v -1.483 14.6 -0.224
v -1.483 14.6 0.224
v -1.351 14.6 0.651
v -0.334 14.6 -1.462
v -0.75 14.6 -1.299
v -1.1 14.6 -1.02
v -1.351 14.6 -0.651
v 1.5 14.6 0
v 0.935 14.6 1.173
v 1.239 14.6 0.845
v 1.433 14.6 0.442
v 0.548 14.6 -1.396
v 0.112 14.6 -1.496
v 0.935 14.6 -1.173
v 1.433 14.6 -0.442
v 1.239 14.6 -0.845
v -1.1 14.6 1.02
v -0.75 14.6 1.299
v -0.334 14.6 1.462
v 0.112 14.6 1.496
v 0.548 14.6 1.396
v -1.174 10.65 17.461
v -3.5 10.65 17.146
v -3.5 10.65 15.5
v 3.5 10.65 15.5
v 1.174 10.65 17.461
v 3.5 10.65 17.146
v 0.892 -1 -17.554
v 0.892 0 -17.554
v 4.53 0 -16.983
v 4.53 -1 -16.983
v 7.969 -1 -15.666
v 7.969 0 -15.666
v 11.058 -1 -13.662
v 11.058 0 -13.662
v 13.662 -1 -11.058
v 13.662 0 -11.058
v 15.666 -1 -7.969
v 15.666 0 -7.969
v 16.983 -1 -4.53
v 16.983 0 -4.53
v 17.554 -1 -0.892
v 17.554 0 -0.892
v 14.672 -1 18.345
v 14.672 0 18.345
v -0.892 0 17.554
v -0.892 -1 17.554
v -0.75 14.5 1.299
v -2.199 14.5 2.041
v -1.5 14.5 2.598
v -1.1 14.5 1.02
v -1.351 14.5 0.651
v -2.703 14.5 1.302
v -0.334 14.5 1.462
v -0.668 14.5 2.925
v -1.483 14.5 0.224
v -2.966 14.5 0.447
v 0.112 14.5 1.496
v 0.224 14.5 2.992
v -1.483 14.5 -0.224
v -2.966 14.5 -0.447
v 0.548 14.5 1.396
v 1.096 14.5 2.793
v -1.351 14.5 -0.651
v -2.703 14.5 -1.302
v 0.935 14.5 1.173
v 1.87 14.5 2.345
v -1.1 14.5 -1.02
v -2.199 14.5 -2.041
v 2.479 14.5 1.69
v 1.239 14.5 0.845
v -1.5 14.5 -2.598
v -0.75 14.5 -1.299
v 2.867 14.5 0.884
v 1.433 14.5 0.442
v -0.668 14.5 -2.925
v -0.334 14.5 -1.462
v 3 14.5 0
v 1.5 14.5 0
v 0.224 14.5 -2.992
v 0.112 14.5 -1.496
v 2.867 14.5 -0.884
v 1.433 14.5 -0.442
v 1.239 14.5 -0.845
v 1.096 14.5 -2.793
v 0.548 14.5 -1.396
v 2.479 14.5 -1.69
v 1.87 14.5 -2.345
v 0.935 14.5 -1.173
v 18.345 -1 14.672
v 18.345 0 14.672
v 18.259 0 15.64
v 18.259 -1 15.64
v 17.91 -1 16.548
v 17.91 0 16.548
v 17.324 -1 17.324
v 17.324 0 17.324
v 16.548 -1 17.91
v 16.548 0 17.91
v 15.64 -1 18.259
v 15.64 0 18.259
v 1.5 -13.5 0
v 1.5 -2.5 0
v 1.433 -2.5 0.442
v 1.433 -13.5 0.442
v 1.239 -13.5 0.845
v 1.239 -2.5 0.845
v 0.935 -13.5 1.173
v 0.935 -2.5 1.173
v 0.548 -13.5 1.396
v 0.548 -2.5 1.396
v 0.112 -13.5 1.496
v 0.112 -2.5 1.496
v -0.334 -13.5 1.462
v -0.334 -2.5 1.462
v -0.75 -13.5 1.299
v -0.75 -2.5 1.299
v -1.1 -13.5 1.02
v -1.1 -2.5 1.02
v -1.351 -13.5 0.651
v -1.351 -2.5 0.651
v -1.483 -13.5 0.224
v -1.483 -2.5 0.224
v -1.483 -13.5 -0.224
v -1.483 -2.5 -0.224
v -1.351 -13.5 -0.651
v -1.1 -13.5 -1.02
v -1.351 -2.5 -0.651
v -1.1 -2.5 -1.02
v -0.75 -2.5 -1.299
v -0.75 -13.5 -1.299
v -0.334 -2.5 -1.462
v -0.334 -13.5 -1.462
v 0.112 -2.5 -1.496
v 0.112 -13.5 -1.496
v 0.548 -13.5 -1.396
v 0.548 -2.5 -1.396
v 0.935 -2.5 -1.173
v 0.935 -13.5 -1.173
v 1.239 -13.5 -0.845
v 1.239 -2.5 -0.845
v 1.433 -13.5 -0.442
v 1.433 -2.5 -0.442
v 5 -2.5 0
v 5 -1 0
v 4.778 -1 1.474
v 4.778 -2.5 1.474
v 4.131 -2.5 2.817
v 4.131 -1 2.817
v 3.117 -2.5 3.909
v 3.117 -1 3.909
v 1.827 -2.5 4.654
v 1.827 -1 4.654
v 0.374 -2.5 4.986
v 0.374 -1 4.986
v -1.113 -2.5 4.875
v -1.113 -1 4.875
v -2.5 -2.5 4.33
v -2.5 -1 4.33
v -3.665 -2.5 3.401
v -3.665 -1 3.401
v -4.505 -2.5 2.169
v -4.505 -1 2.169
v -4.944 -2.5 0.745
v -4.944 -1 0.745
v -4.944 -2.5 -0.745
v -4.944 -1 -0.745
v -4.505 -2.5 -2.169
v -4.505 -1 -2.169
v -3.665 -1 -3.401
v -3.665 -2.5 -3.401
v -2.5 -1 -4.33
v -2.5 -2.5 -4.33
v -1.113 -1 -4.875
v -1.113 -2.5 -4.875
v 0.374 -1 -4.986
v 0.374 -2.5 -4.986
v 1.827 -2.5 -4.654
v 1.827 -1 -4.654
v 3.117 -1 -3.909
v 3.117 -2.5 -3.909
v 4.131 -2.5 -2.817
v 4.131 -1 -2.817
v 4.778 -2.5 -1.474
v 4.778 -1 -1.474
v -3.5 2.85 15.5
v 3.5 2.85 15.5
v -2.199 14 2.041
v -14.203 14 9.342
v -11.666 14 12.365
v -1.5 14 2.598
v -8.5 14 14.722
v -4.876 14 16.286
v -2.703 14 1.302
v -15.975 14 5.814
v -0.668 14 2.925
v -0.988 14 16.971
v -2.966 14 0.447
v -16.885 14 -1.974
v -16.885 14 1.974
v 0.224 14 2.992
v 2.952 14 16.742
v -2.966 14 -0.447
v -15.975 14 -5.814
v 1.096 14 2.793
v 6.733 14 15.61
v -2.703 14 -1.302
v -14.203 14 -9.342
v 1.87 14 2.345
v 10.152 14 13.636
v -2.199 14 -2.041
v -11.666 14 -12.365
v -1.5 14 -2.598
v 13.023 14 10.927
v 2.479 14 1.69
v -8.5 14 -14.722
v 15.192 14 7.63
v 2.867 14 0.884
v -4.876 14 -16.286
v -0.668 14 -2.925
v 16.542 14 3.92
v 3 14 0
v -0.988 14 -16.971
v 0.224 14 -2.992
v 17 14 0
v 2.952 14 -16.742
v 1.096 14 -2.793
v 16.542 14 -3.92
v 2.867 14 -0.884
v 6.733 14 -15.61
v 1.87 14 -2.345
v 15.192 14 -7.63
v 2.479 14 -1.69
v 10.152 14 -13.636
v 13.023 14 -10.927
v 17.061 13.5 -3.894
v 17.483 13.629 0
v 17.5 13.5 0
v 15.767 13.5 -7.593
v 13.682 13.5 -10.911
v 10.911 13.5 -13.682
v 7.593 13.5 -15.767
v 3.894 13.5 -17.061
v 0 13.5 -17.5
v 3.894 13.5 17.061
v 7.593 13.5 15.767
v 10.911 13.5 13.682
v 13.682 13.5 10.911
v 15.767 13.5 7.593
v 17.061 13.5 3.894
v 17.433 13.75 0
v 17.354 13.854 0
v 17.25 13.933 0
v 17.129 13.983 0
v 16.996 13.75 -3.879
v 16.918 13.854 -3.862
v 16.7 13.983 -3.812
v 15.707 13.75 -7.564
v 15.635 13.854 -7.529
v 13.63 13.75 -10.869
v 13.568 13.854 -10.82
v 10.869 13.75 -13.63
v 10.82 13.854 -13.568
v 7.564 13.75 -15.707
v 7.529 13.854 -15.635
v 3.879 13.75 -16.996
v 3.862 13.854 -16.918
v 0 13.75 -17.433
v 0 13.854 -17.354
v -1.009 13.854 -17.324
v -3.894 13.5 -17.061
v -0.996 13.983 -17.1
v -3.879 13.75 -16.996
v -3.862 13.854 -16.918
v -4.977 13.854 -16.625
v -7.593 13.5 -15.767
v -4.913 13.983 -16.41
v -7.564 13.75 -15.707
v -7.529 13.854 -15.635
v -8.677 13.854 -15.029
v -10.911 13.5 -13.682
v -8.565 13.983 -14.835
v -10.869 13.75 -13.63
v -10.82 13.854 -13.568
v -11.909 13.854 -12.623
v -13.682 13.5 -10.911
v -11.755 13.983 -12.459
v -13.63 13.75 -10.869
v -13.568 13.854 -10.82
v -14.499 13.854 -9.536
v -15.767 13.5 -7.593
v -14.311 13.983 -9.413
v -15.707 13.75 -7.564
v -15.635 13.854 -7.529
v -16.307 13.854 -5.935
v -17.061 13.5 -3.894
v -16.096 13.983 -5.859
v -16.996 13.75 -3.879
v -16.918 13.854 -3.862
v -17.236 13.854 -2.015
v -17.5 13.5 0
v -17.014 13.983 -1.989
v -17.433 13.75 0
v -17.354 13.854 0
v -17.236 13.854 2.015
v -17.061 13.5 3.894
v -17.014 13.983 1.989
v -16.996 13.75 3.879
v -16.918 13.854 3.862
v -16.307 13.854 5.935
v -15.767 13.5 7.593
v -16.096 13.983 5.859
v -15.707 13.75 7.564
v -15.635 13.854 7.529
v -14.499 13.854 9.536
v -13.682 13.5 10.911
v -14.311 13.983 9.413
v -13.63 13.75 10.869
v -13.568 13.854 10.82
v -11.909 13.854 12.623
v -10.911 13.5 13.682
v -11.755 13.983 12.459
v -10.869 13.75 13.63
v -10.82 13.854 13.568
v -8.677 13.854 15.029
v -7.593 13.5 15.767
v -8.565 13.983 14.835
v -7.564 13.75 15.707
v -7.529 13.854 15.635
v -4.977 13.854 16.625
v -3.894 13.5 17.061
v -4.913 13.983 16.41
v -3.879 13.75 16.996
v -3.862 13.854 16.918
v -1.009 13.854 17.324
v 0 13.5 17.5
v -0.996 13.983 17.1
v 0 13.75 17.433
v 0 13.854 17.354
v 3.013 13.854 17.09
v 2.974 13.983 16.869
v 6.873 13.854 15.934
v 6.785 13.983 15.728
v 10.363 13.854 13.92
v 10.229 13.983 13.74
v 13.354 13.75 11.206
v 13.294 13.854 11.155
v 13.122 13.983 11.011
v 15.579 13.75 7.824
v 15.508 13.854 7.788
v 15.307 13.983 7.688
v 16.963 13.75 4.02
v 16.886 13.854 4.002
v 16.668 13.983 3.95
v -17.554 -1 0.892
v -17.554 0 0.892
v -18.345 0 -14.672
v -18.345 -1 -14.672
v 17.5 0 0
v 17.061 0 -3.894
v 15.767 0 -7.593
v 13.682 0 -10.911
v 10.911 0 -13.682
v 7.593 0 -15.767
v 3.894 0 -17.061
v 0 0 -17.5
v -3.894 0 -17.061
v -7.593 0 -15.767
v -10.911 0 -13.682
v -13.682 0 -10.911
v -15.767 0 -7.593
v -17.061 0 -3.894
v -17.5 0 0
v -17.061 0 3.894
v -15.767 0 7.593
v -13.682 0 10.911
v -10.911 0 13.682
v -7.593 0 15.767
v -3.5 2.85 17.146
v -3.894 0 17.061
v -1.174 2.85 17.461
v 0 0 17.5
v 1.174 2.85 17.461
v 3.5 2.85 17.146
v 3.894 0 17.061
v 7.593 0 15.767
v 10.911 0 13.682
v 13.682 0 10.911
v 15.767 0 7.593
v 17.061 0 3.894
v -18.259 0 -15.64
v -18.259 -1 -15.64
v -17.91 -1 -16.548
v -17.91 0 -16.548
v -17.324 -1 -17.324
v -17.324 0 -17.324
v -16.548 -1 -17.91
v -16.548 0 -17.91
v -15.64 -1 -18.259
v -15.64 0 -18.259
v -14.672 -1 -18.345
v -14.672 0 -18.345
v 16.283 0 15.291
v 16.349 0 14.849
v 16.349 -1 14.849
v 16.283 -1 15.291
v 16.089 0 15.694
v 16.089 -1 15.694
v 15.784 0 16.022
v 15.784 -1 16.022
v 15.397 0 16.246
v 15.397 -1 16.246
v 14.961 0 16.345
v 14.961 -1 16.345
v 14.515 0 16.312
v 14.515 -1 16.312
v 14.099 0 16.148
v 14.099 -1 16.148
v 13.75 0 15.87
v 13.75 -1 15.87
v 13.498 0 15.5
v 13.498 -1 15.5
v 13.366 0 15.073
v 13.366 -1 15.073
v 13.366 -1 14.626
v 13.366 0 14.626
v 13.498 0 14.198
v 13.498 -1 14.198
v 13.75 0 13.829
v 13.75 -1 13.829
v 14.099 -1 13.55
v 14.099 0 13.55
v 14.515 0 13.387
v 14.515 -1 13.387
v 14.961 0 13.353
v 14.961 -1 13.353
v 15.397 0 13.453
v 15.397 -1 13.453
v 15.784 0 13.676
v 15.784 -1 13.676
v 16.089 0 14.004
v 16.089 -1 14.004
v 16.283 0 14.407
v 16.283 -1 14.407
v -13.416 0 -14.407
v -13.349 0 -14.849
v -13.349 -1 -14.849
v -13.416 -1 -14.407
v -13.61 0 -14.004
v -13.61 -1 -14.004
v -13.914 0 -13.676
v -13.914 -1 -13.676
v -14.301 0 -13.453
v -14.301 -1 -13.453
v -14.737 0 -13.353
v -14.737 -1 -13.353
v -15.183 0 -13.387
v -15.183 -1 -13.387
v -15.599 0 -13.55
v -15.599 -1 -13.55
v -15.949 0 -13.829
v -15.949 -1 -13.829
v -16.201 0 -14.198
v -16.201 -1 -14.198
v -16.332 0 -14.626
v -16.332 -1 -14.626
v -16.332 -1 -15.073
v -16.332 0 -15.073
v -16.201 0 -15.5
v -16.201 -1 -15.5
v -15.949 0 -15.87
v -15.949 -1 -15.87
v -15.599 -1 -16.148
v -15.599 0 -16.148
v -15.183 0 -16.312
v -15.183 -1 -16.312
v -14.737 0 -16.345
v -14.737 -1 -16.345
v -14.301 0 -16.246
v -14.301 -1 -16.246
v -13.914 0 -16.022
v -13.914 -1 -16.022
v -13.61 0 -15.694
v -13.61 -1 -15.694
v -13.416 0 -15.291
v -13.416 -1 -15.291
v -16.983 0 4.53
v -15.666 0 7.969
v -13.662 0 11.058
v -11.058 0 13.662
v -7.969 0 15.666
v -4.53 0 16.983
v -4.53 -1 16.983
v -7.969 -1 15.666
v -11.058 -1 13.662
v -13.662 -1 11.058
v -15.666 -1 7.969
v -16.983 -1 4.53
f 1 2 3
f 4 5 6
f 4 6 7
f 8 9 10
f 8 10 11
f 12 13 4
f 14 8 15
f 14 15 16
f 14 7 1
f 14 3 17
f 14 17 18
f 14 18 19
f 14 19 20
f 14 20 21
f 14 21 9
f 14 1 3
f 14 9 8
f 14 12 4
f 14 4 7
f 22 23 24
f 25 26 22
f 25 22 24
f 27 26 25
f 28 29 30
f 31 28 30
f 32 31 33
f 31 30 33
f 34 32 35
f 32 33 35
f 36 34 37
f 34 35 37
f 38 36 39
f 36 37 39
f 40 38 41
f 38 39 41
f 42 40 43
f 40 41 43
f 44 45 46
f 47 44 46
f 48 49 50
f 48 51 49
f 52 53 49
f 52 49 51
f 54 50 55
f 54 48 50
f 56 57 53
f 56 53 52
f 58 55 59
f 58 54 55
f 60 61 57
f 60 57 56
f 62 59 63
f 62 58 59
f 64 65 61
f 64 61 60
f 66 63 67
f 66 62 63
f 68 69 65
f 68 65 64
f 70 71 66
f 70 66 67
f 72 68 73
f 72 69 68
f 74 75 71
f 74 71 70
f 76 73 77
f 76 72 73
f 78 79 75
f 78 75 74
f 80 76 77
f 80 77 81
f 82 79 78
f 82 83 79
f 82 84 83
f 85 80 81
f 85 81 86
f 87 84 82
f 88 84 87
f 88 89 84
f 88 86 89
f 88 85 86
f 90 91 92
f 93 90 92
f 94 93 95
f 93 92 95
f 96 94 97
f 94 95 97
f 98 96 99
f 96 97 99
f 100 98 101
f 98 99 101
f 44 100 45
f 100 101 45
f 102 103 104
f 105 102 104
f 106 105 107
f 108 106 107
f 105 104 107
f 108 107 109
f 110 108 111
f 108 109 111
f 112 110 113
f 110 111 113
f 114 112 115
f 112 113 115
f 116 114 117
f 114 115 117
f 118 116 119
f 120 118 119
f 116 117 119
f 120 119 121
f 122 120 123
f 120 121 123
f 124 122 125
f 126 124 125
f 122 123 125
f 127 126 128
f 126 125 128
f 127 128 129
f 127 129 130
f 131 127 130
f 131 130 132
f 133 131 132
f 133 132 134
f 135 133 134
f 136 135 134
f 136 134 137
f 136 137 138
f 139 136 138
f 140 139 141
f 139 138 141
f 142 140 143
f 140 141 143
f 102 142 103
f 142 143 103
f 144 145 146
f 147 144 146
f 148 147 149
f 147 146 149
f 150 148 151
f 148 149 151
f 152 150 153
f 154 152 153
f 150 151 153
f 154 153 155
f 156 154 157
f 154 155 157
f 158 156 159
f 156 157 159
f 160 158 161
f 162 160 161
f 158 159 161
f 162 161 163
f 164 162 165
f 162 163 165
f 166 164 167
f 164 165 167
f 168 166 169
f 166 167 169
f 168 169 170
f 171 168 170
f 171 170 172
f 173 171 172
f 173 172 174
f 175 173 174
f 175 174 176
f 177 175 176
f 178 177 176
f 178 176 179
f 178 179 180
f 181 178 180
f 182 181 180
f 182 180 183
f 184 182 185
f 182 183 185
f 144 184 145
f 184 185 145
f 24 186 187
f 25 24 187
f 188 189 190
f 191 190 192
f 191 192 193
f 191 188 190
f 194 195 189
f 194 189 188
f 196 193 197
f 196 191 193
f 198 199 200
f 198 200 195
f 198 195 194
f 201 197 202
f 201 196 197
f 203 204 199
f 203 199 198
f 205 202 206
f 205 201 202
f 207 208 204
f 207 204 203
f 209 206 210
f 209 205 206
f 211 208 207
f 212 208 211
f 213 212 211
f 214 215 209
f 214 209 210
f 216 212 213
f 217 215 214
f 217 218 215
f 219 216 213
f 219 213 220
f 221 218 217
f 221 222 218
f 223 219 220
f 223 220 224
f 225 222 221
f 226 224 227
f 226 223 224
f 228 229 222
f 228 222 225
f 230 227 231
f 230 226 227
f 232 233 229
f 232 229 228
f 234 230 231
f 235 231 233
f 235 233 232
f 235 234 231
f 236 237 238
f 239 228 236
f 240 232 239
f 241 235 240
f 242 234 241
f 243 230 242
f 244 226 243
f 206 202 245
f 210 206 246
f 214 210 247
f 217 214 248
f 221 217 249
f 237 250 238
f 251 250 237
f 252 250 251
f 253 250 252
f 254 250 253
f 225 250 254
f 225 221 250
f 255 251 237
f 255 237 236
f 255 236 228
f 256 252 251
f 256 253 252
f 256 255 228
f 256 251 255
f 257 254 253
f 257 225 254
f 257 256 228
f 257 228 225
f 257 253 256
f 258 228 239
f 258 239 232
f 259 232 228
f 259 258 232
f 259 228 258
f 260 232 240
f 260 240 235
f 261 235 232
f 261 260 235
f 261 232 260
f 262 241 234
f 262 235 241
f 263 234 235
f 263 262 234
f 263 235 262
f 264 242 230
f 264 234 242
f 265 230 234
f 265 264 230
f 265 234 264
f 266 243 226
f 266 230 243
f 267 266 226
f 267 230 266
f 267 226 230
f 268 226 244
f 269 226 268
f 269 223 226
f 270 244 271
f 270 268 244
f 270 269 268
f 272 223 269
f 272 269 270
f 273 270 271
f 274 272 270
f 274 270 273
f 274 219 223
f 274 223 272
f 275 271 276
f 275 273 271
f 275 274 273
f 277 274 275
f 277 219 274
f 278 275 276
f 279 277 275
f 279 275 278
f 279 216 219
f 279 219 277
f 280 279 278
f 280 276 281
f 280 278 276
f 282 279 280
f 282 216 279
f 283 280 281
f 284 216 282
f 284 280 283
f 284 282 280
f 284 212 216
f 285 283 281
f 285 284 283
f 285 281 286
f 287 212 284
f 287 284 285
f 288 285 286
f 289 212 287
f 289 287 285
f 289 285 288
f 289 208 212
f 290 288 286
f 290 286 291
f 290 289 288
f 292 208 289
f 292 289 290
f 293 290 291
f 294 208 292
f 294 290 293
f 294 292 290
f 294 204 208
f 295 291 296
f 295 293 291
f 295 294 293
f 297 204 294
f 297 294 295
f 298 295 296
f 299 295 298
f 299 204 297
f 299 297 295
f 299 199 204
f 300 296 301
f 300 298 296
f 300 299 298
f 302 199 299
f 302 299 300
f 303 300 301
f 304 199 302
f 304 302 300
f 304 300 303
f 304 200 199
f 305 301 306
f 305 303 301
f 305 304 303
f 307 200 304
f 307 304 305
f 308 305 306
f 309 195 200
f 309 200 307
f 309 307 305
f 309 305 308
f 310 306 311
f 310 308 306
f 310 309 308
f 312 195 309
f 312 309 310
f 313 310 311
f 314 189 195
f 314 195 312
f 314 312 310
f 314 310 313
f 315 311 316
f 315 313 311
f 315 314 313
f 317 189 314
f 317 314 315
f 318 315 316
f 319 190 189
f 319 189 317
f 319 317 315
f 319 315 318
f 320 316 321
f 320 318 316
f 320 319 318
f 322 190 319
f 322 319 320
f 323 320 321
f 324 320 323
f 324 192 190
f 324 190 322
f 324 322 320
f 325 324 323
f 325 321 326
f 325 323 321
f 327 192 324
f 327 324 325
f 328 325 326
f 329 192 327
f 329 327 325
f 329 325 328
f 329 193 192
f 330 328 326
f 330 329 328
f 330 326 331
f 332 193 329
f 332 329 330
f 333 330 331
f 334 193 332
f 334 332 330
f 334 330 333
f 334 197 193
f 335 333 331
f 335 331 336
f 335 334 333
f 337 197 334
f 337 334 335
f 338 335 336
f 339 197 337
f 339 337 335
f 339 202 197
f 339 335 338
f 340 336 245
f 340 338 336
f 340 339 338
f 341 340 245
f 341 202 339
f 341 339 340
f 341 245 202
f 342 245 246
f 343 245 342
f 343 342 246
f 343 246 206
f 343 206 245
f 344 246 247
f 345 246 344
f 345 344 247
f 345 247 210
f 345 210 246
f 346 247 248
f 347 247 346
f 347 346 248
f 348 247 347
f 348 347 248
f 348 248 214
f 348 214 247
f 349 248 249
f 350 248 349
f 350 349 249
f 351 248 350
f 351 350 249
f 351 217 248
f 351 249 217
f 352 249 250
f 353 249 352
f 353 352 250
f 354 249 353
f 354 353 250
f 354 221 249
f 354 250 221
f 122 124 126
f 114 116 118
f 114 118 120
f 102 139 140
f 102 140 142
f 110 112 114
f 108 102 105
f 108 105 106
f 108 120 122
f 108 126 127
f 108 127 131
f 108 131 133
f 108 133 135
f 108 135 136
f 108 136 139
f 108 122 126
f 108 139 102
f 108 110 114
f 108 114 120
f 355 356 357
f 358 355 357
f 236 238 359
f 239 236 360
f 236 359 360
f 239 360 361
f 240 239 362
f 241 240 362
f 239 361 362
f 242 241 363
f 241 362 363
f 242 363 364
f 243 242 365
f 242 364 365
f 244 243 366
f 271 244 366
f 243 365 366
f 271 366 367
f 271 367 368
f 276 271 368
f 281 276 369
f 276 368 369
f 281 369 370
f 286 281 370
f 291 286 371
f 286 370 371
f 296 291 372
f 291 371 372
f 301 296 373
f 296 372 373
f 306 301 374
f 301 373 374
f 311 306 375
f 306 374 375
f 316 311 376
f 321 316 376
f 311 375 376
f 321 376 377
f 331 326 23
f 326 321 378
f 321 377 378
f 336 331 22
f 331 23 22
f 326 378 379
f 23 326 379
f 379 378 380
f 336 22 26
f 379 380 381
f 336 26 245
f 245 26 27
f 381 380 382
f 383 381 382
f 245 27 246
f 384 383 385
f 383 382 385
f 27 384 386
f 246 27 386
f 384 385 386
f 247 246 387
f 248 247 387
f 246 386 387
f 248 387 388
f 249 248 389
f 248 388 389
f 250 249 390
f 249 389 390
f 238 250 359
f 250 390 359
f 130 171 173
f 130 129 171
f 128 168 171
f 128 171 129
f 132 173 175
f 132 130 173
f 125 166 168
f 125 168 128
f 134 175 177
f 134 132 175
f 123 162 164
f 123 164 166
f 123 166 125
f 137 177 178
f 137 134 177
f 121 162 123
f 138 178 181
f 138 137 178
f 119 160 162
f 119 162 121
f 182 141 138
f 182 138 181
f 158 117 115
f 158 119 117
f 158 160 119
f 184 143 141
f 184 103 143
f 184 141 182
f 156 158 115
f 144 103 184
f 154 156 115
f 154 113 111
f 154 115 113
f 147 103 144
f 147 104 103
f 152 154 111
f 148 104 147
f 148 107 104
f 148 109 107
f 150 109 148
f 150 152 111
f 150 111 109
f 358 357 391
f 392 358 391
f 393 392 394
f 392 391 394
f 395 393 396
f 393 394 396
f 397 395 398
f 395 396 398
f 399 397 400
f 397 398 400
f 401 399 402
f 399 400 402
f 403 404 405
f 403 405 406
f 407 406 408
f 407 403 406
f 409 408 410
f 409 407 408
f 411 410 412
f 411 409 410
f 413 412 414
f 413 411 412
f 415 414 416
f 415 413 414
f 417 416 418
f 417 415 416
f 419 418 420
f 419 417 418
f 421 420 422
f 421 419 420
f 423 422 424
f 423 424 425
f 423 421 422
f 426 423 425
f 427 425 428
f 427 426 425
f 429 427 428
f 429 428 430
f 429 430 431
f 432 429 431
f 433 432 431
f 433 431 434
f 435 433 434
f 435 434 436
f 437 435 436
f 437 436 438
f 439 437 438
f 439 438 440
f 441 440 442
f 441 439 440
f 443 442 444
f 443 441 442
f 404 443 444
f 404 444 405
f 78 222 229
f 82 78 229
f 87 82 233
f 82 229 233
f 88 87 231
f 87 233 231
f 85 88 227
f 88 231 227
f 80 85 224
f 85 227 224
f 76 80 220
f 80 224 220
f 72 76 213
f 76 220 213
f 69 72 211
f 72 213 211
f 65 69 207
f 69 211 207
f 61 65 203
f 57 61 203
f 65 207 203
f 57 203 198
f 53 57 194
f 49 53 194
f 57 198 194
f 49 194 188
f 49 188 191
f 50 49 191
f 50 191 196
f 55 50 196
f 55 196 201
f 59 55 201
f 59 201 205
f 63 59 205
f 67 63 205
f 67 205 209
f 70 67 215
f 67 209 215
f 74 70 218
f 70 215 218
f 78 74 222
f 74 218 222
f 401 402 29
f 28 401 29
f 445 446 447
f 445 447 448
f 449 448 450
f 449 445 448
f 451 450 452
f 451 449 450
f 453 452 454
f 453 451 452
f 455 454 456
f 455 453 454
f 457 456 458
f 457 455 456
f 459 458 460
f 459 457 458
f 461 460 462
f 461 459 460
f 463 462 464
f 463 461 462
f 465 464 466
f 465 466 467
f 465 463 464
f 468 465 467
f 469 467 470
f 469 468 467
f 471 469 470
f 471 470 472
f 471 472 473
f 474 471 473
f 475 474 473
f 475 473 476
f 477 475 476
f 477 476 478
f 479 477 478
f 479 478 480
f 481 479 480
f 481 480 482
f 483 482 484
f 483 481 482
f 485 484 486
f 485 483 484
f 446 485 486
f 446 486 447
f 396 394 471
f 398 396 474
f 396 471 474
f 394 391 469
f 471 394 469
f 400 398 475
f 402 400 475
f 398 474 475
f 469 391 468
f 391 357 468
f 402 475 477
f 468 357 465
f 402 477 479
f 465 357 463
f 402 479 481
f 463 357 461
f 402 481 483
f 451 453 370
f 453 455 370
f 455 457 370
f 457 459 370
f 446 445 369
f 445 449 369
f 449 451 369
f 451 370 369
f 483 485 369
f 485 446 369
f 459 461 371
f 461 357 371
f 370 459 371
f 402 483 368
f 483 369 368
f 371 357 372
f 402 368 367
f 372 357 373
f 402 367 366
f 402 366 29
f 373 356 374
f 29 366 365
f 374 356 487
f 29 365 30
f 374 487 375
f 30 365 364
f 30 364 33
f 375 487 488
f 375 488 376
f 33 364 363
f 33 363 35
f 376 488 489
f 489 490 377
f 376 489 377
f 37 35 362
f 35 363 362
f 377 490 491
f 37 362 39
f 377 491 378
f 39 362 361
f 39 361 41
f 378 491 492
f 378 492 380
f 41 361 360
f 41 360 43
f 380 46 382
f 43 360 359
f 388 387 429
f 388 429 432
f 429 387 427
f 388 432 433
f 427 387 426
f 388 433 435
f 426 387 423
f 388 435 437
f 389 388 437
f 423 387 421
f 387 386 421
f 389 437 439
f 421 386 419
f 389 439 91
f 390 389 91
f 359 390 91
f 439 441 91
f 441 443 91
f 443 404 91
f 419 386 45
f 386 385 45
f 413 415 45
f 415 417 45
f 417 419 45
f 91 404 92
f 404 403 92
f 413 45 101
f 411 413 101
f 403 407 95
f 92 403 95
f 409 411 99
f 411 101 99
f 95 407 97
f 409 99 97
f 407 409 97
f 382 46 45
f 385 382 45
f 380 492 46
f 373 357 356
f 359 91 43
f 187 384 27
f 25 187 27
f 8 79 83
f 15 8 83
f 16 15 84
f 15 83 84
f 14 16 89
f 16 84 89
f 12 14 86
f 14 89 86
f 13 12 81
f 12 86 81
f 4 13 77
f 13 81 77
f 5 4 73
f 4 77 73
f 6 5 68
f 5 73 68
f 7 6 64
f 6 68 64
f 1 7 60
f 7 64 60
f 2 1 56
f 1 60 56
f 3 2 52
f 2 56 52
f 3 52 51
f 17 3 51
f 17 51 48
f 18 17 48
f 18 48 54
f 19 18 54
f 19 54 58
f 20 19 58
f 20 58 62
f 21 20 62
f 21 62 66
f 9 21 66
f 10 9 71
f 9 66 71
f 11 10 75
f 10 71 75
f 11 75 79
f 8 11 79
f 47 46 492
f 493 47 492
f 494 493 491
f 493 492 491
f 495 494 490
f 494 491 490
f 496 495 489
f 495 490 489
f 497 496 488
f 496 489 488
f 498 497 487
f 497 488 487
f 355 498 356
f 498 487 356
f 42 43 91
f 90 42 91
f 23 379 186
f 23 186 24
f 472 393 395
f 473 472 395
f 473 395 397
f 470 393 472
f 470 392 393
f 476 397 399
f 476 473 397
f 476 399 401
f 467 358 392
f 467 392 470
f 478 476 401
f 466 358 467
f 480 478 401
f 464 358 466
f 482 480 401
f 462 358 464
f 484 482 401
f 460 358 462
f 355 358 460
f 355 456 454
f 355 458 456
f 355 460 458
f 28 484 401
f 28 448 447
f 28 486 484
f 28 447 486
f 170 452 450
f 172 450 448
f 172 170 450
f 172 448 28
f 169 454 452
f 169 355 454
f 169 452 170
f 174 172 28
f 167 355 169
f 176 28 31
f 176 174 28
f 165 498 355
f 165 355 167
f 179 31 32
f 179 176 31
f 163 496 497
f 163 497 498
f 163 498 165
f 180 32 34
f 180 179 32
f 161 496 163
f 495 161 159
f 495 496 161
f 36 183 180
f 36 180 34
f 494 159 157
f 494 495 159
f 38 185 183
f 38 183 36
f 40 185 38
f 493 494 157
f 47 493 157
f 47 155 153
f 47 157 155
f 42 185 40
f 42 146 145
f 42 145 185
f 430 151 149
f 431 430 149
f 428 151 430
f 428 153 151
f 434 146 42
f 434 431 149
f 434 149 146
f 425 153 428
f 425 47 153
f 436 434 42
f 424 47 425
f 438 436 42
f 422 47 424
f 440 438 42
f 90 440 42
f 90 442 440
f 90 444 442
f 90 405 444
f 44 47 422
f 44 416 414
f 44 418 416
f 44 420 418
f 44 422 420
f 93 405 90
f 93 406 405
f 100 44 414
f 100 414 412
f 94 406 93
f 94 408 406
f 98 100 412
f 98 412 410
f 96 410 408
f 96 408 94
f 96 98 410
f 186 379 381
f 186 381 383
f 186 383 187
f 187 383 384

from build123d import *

# Parameters (mm, degrees)
SKETCH1_R           = 17.5
BOSS_EXTRUDE1_DEPTH = 14
SKETCH2_R           = 1.5
BOSS_EXTRUDE2_DEPTH = 1
SKETCH3_R           = 5
BOSS_EXTRUDE3_DEPTH = 1.5
SKETCH4_R           = 1.5
BOSS_EXTRUDE4_DEPTH = 11
SKETCH5_R           = 3
BOSS_EXTRUDE5_DEPTH = 0.5
SKETCH6_R           = 1.5
BOSS_EXTRUDE6_DEPTH = 0.1
FILLET1_R           = 0.5
SKETCH7_W           = 7
SKETCH7_H           = 7.8
CUT_EXTRUDE3_DEPTH  = 2


with BuildPart() as part:
    # Sketch1 → Boss-Extrude1 (new body)
    with BuildSketch(Plane(origin=(0, 0, 0), x_dir=(1, 0, 0), z_dir=(0, 1, 0))):
        Circle(SKETCH1_R)
    extrude(amount=BOSS_EXTRUDE1_DEPTH)

    # Sketch2 → Boss-Extrude2 (add)
    with BuildSketch(Plane.XZ):
        with BuildLine():
            Line((14.671631406, 18.344732976), (-0.891940662, 17.553925067))
            ThreePointArc((-0.891940662, 17.553925067), (-12.428512449, 12.428512449), (-17.553925067, 0.891940662))
            Line((-17.553925067, 0.891940662), (-18.344732976, -14.671631406))
            ThreePointArc((-18.344732976, -14.671631406), (-17.324116139, -17.324116139), (-14.671631406, -18.344732976))
            Line((-14.671631406, -18.344732976), (0.891940662, -17.553925067))
            ThreePointArc((0.891940662, -17.553925067), (12.428512449, -12.428512449), (17.553925067, -0.891940662))
            Line((17.553925067, -0.891940662), (18.344732976, 14.671631406))
            ThreePointArc((18.344732976, 14.671631406), (17.324116139, 17.324116139), (14.671631406, 18.344732976))
        make_face()
        with Locations((14.849242405, 14.849242405)):
            Circle(SKETCH2_R, mode=Mode.SUBTRACT)
        with Locations((-14.849242405, -14.849242405)):
            Circle(SKETCH2_R, mode=Mode.SUBTRACT)
    extrude(amount=BOSS_EXTRUDE2_DEPTH)

    # Sketch3 → Boss-Extrude3 (add)
    with BuildSketch(Plane.XZ.offset(1)):
        Circle(SKETCH3_R)
    extrude(amount=BOSS_EXTRUDE3_DEPTH)

    # Sketch4 → Boss-Extrude4 (add)
    with BuildSketch(Plane.XZ.offset(2.5)):
        Circle(SKETCH4_R)
    extrude(amount=BOSS_EXTRUDE4_DEPTH)

    # Sketch5 → Boss-Extrude5 (add)
    with BuildSketch(Plane(origin=(0, 14, 0), x_dir=(1, 0, 0), z_dir=(0, 1, 0))):
        Circle(SKETCH5_R)
    extrude(amount=BOSS_EXTRUDE5_DEPTH)

    # Sketch6 → Boss-Extrude6 (add)
    with BuildSketch(Plane(origin=(0, 14.5, 0), x_dir=(1, 0, 0), z_dir=(0, 1, 0))):
        Circle(SKETCH6_R)
    extrude(amount=BOSS_EXTRUDE6_DEPTH)

    # Fillet1
    fillet1_edges = [part.edges().sort_by_distance(p)[0] for p in [
        (-17.5, 14, 0),
    ]]
    fillet(fillet1_edges, radius=FILLET1_R)

    # Sketch7 → Cut-Extrude3 (cut)
    with BuildSketch(Plane.XY.offset(17.5)):
        with Locations((0, 6.75)):
            Rectangle(SKETCH7_W, SKETCH7_H)
    extrude(amount=-CUT_EXTRUDE3_DEPTH, mode=Mode.SUBTRACT)


solid = part.part
